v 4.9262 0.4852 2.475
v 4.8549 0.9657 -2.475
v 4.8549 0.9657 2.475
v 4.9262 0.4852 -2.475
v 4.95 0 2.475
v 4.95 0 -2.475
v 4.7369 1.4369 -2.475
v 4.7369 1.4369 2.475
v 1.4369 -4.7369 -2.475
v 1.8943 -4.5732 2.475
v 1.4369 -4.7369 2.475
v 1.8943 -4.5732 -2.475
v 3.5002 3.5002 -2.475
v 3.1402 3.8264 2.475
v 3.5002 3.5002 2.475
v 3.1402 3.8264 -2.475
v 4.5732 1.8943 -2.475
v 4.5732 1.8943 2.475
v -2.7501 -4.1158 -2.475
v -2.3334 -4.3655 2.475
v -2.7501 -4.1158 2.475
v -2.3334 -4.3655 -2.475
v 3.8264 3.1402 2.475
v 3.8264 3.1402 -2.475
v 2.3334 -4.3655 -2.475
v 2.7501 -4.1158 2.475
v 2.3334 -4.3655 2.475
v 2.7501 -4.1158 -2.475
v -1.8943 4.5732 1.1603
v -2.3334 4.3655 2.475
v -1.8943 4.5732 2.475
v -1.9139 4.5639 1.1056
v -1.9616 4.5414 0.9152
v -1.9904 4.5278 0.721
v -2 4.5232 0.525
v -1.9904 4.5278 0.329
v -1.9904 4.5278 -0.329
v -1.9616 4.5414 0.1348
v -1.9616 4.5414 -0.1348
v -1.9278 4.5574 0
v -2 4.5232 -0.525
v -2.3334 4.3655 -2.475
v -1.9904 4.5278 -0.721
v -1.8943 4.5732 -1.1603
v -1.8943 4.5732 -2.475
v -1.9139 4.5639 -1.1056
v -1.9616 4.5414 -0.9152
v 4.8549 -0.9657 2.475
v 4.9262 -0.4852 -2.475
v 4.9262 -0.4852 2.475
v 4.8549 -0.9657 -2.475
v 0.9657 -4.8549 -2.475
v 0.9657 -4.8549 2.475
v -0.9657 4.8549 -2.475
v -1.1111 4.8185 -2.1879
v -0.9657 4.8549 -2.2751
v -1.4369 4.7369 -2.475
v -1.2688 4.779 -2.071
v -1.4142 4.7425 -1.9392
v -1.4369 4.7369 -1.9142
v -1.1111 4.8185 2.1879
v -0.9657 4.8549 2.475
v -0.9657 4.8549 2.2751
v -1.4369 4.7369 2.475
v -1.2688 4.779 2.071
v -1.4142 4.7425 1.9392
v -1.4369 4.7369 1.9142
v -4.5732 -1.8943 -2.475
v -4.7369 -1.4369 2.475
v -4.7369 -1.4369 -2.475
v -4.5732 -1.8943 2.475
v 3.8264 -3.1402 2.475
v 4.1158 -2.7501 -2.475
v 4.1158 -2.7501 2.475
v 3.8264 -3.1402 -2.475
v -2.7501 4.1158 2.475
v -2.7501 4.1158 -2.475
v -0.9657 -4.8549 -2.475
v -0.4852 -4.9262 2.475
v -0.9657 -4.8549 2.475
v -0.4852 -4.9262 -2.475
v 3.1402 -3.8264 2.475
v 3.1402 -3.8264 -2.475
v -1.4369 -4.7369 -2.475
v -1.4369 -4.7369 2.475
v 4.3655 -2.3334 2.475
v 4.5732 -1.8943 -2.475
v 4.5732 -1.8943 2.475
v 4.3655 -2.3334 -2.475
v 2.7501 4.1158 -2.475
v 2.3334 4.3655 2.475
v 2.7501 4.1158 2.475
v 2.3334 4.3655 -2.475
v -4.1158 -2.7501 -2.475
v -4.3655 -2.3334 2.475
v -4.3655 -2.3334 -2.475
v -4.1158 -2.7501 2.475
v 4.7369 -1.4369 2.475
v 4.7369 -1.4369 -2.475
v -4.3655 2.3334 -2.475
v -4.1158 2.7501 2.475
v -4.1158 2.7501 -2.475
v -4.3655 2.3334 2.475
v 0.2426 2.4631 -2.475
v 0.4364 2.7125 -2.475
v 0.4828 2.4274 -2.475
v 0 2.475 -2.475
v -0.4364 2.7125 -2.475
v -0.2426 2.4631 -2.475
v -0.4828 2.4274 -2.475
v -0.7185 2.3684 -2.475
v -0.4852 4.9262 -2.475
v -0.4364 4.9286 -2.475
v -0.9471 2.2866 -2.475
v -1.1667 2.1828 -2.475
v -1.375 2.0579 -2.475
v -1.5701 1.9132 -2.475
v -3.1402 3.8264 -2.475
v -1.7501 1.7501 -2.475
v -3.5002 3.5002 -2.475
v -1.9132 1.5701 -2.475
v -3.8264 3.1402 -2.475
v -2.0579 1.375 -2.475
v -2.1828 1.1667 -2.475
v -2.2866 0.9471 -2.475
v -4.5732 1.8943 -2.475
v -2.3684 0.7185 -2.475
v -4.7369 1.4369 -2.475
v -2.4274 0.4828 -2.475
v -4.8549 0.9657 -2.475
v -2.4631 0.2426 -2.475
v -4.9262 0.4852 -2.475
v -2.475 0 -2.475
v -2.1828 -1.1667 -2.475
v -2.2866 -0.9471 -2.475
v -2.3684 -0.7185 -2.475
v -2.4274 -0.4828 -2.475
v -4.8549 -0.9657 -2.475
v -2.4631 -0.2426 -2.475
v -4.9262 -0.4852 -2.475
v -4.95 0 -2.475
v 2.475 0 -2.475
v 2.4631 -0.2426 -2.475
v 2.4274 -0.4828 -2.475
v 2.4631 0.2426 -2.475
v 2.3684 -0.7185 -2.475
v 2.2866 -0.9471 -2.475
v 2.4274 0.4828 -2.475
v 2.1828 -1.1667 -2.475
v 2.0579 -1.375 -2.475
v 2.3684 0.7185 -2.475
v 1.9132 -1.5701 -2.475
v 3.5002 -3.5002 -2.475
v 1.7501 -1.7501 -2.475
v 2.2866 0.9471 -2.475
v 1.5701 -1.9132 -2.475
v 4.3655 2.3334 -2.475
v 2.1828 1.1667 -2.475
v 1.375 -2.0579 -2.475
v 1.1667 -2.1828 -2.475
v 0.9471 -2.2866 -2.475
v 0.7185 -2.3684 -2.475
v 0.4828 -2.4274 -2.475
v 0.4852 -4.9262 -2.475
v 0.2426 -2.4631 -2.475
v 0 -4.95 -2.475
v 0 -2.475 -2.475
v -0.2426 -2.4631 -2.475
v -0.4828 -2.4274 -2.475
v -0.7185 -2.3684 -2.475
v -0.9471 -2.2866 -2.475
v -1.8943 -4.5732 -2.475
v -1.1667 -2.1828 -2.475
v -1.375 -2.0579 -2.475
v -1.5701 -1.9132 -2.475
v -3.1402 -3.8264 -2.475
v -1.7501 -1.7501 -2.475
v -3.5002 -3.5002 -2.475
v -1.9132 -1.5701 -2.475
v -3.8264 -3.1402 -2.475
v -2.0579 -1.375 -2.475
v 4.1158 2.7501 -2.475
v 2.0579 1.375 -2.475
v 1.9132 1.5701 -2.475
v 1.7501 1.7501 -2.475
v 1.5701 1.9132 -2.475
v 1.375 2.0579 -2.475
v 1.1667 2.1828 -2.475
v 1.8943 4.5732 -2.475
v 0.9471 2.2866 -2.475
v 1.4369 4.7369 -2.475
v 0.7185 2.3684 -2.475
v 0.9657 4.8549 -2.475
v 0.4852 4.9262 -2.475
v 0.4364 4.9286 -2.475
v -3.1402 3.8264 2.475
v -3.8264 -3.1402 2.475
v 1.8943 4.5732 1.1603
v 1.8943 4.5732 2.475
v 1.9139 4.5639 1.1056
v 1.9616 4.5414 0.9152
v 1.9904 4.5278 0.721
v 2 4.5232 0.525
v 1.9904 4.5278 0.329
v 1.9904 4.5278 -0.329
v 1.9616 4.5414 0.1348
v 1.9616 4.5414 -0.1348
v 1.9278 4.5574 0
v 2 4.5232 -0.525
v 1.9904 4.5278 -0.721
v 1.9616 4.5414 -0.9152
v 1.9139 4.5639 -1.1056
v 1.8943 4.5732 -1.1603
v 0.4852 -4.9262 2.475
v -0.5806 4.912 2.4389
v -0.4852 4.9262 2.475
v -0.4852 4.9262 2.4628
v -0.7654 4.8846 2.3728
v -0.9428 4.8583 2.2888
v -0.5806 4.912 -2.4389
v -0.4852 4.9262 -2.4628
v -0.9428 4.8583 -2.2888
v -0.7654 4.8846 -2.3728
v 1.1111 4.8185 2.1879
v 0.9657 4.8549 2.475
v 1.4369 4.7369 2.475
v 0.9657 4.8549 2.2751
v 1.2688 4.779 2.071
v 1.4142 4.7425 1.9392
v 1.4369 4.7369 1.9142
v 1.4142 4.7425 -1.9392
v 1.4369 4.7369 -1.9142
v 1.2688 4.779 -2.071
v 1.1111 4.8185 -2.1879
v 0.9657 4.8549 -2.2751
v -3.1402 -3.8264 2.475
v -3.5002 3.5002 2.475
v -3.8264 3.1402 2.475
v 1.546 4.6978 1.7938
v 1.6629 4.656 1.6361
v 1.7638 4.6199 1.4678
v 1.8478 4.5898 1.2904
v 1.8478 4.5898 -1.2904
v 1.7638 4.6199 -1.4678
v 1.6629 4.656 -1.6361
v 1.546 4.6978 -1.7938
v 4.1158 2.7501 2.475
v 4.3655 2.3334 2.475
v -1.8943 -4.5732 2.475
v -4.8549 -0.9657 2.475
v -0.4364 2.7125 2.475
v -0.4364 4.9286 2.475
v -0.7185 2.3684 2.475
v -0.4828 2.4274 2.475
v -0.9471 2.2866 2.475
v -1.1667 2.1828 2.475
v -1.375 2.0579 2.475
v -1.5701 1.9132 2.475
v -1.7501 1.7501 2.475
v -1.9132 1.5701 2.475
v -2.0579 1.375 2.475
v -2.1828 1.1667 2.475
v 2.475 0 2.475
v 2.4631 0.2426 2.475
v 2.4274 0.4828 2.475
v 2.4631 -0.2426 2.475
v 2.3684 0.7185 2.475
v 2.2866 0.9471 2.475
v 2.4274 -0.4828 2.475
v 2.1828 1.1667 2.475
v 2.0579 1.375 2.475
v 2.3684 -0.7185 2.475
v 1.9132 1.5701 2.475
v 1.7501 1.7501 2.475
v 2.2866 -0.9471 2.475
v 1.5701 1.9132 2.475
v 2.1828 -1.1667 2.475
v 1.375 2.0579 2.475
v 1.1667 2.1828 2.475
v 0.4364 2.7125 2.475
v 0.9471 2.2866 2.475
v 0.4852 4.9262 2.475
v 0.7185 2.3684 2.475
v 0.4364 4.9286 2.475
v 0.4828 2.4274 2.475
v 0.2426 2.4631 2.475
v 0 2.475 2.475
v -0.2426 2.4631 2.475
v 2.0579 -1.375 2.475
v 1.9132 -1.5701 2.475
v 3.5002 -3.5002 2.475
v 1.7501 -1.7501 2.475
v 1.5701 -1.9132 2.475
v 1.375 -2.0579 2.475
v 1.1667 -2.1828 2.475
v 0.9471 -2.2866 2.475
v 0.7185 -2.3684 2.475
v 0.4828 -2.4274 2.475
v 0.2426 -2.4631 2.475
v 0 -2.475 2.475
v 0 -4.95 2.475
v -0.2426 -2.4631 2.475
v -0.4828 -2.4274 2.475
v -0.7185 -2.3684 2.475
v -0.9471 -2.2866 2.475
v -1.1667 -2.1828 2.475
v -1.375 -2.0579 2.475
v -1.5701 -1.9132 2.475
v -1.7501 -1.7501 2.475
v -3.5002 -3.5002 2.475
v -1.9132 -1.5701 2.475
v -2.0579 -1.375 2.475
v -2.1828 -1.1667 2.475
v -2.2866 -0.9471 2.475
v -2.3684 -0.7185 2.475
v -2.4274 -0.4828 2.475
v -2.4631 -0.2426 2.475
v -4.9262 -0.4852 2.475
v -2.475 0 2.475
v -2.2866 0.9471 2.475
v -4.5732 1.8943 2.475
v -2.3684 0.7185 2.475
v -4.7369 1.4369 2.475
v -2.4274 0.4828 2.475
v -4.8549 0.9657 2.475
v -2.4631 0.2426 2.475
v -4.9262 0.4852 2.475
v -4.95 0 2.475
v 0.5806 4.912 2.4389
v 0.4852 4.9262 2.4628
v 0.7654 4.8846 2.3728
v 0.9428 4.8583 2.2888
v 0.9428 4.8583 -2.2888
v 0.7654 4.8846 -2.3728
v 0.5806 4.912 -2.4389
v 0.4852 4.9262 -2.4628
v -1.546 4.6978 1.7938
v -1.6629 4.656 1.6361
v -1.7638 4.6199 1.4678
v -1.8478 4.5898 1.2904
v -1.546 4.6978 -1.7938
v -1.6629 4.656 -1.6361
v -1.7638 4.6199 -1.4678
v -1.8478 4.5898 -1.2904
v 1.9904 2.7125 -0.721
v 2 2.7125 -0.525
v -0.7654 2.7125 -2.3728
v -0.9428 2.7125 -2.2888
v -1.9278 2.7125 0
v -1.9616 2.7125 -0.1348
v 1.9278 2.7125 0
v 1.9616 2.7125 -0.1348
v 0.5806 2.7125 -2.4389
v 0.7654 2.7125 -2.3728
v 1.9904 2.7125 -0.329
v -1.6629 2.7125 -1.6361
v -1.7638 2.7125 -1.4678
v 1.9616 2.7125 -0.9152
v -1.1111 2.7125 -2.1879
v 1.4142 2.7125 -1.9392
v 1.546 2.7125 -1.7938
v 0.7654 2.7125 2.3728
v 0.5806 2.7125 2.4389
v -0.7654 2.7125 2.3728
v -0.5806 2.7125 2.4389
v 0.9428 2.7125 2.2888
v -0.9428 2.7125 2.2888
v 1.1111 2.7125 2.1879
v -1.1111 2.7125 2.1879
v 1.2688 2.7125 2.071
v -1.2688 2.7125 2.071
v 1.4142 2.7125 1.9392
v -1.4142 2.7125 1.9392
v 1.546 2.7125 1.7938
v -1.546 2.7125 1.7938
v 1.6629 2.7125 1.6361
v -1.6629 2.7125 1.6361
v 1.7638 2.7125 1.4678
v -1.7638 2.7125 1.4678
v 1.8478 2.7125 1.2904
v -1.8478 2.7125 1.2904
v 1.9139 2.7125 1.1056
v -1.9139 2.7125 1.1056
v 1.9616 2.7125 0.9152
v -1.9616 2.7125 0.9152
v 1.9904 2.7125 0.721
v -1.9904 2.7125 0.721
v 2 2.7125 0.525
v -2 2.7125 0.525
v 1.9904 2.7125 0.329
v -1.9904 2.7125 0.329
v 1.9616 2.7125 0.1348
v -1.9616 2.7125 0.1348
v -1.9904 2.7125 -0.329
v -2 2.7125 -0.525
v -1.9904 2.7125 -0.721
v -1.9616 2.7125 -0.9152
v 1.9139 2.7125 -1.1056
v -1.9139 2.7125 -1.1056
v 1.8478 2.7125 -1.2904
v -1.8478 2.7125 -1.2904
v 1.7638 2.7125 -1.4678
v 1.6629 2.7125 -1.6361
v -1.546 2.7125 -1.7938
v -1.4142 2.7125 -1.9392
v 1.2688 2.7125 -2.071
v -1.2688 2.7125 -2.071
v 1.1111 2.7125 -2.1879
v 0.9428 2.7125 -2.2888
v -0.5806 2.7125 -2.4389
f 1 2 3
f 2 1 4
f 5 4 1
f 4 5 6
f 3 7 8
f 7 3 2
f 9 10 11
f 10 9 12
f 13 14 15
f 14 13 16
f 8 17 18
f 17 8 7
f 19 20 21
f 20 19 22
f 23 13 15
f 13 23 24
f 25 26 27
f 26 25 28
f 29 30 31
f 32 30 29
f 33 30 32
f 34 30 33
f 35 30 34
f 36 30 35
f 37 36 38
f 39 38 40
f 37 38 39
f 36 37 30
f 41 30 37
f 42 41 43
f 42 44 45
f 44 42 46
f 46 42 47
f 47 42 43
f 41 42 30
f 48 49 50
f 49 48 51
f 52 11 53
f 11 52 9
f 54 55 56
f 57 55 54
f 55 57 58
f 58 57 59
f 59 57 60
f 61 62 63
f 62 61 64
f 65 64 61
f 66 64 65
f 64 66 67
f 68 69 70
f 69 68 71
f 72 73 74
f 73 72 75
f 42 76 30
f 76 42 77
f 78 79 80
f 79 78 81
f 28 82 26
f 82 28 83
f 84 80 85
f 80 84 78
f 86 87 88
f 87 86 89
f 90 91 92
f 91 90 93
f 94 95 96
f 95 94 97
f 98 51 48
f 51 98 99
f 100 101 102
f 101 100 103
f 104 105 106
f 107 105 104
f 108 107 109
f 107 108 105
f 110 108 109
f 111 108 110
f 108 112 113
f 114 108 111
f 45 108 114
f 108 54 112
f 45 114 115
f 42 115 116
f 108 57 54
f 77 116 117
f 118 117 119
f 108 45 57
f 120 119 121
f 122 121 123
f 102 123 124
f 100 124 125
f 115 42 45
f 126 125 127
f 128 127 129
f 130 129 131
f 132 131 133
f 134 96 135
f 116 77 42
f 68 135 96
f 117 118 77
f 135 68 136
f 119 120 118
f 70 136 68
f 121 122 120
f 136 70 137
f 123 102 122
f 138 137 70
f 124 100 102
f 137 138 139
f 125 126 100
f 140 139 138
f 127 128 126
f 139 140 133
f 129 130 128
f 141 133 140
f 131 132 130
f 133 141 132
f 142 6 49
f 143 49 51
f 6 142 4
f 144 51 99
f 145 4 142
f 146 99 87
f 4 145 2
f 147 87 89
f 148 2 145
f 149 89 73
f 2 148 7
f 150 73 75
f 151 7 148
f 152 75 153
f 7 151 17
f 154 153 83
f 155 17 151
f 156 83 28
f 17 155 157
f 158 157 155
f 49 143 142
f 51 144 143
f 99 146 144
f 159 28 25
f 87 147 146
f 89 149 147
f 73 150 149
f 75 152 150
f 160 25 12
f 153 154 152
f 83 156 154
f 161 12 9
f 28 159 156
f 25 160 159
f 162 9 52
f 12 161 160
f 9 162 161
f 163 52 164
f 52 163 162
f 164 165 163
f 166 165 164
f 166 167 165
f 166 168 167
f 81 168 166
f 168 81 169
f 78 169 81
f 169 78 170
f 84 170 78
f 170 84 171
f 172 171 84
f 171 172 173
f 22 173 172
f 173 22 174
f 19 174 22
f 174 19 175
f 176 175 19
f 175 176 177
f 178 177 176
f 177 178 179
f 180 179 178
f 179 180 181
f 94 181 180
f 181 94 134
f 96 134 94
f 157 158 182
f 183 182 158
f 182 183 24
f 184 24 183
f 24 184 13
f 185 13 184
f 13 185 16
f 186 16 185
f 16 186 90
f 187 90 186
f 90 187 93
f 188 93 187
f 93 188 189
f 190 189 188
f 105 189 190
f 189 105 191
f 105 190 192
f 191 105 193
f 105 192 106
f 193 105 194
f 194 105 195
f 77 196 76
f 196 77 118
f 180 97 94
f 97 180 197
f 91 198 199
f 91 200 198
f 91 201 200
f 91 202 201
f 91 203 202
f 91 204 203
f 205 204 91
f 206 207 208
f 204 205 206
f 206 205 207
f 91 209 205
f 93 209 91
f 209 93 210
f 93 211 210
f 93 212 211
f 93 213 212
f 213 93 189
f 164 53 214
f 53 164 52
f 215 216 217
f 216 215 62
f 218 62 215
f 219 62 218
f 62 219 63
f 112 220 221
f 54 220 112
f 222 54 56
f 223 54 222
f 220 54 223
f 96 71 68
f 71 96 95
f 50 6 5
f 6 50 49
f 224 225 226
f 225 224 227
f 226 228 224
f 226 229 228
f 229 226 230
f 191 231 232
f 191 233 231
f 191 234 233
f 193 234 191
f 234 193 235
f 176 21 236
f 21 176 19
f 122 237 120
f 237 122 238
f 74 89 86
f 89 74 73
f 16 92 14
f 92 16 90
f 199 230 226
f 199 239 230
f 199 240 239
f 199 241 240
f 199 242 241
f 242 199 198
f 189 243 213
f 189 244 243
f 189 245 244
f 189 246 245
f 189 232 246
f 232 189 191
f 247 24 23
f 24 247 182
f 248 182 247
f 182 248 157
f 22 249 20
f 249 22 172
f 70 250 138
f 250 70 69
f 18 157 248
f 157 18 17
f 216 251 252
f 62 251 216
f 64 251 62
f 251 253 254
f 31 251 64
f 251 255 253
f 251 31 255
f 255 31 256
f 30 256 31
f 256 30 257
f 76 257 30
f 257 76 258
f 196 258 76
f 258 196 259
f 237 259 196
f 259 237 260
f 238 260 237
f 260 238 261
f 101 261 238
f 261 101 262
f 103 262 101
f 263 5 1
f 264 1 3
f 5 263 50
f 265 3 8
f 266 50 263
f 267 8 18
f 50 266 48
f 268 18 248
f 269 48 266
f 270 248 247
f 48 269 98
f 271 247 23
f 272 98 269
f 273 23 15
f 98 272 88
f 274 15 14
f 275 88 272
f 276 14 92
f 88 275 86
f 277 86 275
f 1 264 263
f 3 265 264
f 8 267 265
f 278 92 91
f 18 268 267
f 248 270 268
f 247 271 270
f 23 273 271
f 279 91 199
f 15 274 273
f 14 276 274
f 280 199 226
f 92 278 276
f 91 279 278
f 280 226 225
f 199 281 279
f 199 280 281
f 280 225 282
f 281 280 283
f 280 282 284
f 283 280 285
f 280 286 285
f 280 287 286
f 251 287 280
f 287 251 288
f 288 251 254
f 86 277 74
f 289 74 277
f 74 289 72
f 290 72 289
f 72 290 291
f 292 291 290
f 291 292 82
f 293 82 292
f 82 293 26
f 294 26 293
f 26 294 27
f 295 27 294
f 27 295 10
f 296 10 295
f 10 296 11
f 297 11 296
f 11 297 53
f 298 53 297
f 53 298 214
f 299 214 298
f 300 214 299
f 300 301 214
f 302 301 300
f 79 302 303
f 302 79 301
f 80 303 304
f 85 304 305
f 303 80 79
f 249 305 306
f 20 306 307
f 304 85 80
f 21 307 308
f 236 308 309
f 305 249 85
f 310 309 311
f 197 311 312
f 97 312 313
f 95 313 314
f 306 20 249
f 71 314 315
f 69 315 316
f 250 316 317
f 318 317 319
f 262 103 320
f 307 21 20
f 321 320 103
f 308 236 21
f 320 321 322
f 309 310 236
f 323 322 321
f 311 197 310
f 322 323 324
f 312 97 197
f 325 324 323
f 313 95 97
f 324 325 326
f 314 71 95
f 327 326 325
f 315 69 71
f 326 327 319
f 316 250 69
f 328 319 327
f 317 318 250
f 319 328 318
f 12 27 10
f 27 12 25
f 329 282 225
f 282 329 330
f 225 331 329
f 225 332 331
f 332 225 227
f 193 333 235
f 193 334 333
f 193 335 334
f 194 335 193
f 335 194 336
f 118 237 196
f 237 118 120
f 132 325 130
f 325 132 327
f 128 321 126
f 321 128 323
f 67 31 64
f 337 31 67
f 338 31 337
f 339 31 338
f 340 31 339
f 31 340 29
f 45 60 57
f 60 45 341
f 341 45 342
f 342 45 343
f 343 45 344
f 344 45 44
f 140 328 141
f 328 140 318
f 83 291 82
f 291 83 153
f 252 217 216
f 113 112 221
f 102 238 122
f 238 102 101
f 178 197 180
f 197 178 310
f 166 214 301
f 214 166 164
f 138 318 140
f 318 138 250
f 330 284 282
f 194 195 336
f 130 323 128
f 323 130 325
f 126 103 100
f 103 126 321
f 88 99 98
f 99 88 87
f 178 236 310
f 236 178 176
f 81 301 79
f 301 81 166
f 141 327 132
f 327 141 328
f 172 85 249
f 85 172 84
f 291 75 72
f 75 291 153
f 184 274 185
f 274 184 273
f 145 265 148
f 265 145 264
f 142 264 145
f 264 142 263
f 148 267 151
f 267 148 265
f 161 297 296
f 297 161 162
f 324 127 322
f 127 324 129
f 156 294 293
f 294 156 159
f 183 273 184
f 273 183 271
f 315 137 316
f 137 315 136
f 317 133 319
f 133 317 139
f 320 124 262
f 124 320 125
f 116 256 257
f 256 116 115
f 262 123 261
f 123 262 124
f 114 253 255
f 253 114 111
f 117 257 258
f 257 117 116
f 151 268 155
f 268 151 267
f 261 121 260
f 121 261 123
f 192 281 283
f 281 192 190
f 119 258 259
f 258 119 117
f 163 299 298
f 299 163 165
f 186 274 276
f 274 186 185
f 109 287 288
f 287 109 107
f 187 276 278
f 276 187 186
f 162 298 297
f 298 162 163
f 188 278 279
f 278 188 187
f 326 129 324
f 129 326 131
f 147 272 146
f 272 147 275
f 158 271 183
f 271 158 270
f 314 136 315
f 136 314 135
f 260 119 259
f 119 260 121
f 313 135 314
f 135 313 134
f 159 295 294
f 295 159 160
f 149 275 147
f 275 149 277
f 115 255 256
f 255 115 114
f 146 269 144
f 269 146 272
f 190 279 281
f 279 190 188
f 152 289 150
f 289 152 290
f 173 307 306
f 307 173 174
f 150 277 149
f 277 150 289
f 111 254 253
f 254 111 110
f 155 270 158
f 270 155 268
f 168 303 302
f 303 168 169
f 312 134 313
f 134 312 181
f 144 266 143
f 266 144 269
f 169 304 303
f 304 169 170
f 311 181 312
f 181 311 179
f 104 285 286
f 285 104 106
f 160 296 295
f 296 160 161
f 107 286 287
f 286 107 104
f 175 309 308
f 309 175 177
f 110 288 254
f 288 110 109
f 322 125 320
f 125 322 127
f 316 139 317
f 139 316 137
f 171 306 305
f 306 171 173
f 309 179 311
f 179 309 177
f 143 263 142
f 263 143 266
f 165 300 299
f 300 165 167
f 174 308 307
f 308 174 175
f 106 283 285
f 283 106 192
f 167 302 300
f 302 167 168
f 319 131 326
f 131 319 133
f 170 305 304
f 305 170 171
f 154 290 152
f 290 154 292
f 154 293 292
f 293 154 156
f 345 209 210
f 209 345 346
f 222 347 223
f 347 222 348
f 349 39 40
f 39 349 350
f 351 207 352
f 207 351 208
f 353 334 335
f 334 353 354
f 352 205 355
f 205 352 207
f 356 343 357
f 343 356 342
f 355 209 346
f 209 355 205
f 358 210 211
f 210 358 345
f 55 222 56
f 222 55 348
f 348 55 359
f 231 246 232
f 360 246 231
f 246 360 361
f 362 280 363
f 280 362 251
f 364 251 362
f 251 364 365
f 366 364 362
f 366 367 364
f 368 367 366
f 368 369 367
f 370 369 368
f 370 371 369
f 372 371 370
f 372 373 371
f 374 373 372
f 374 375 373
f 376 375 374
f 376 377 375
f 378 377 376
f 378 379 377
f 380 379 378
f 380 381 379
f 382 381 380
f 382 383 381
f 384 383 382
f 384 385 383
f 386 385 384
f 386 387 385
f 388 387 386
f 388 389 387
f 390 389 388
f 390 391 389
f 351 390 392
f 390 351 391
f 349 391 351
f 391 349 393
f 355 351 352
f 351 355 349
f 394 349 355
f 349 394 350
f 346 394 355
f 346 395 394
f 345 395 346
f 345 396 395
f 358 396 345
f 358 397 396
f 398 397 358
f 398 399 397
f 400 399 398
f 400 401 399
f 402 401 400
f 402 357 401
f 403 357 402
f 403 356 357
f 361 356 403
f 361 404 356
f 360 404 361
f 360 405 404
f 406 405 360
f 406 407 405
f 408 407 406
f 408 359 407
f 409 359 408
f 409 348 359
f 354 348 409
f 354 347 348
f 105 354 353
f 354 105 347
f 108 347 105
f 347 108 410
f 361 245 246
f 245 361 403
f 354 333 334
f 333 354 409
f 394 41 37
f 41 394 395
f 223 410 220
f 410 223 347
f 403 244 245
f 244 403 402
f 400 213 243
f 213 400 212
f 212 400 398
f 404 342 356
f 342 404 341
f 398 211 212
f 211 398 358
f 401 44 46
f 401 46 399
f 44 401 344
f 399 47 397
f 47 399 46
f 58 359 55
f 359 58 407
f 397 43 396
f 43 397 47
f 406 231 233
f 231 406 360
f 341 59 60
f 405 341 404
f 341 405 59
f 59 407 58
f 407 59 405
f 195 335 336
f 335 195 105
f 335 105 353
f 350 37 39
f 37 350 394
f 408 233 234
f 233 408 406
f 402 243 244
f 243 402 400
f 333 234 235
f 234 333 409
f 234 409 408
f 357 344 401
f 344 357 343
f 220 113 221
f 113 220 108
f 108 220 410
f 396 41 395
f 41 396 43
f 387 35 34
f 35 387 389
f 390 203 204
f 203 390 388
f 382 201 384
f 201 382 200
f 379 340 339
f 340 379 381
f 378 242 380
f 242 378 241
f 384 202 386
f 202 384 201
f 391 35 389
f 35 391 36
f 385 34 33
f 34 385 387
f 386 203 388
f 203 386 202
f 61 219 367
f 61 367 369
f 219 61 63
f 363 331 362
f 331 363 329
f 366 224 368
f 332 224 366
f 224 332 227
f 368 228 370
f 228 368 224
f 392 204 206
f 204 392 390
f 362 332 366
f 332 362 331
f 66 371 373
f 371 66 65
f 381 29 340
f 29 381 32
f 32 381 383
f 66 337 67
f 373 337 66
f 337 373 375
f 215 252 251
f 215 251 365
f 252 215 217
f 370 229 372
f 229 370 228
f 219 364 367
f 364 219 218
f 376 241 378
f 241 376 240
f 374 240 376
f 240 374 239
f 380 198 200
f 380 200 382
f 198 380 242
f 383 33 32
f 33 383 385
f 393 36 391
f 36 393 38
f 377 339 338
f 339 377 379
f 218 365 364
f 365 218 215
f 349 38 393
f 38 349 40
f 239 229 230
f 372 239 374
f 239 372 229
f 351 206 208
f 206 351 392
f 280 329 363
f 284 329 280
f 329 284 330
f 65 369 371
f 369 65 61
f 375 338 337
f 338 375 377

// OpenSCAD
// COBRA Vertebra - C6 V5
// Height: 4.95mm, OD: 9.9mm

$fn = 64;

difference() {
    // Outer cylinder
    cylinder(h=4.95, d=9.9, center=true);
    
    // Inner channel
    cylinder(h=6.95, d=4.95, center=true);

    // Pivot holes
    translate([0, 4.95, -0.5249999999999999])
    rotate([90, 0, 0])
    cylinder(h=4.475, d=4, center=true);
    
    translate([0, 4.95, 0.5249999999999999])
    rotate([90, 0, 0])
    cylinder(h=4.475, d=4, center=true);
}
